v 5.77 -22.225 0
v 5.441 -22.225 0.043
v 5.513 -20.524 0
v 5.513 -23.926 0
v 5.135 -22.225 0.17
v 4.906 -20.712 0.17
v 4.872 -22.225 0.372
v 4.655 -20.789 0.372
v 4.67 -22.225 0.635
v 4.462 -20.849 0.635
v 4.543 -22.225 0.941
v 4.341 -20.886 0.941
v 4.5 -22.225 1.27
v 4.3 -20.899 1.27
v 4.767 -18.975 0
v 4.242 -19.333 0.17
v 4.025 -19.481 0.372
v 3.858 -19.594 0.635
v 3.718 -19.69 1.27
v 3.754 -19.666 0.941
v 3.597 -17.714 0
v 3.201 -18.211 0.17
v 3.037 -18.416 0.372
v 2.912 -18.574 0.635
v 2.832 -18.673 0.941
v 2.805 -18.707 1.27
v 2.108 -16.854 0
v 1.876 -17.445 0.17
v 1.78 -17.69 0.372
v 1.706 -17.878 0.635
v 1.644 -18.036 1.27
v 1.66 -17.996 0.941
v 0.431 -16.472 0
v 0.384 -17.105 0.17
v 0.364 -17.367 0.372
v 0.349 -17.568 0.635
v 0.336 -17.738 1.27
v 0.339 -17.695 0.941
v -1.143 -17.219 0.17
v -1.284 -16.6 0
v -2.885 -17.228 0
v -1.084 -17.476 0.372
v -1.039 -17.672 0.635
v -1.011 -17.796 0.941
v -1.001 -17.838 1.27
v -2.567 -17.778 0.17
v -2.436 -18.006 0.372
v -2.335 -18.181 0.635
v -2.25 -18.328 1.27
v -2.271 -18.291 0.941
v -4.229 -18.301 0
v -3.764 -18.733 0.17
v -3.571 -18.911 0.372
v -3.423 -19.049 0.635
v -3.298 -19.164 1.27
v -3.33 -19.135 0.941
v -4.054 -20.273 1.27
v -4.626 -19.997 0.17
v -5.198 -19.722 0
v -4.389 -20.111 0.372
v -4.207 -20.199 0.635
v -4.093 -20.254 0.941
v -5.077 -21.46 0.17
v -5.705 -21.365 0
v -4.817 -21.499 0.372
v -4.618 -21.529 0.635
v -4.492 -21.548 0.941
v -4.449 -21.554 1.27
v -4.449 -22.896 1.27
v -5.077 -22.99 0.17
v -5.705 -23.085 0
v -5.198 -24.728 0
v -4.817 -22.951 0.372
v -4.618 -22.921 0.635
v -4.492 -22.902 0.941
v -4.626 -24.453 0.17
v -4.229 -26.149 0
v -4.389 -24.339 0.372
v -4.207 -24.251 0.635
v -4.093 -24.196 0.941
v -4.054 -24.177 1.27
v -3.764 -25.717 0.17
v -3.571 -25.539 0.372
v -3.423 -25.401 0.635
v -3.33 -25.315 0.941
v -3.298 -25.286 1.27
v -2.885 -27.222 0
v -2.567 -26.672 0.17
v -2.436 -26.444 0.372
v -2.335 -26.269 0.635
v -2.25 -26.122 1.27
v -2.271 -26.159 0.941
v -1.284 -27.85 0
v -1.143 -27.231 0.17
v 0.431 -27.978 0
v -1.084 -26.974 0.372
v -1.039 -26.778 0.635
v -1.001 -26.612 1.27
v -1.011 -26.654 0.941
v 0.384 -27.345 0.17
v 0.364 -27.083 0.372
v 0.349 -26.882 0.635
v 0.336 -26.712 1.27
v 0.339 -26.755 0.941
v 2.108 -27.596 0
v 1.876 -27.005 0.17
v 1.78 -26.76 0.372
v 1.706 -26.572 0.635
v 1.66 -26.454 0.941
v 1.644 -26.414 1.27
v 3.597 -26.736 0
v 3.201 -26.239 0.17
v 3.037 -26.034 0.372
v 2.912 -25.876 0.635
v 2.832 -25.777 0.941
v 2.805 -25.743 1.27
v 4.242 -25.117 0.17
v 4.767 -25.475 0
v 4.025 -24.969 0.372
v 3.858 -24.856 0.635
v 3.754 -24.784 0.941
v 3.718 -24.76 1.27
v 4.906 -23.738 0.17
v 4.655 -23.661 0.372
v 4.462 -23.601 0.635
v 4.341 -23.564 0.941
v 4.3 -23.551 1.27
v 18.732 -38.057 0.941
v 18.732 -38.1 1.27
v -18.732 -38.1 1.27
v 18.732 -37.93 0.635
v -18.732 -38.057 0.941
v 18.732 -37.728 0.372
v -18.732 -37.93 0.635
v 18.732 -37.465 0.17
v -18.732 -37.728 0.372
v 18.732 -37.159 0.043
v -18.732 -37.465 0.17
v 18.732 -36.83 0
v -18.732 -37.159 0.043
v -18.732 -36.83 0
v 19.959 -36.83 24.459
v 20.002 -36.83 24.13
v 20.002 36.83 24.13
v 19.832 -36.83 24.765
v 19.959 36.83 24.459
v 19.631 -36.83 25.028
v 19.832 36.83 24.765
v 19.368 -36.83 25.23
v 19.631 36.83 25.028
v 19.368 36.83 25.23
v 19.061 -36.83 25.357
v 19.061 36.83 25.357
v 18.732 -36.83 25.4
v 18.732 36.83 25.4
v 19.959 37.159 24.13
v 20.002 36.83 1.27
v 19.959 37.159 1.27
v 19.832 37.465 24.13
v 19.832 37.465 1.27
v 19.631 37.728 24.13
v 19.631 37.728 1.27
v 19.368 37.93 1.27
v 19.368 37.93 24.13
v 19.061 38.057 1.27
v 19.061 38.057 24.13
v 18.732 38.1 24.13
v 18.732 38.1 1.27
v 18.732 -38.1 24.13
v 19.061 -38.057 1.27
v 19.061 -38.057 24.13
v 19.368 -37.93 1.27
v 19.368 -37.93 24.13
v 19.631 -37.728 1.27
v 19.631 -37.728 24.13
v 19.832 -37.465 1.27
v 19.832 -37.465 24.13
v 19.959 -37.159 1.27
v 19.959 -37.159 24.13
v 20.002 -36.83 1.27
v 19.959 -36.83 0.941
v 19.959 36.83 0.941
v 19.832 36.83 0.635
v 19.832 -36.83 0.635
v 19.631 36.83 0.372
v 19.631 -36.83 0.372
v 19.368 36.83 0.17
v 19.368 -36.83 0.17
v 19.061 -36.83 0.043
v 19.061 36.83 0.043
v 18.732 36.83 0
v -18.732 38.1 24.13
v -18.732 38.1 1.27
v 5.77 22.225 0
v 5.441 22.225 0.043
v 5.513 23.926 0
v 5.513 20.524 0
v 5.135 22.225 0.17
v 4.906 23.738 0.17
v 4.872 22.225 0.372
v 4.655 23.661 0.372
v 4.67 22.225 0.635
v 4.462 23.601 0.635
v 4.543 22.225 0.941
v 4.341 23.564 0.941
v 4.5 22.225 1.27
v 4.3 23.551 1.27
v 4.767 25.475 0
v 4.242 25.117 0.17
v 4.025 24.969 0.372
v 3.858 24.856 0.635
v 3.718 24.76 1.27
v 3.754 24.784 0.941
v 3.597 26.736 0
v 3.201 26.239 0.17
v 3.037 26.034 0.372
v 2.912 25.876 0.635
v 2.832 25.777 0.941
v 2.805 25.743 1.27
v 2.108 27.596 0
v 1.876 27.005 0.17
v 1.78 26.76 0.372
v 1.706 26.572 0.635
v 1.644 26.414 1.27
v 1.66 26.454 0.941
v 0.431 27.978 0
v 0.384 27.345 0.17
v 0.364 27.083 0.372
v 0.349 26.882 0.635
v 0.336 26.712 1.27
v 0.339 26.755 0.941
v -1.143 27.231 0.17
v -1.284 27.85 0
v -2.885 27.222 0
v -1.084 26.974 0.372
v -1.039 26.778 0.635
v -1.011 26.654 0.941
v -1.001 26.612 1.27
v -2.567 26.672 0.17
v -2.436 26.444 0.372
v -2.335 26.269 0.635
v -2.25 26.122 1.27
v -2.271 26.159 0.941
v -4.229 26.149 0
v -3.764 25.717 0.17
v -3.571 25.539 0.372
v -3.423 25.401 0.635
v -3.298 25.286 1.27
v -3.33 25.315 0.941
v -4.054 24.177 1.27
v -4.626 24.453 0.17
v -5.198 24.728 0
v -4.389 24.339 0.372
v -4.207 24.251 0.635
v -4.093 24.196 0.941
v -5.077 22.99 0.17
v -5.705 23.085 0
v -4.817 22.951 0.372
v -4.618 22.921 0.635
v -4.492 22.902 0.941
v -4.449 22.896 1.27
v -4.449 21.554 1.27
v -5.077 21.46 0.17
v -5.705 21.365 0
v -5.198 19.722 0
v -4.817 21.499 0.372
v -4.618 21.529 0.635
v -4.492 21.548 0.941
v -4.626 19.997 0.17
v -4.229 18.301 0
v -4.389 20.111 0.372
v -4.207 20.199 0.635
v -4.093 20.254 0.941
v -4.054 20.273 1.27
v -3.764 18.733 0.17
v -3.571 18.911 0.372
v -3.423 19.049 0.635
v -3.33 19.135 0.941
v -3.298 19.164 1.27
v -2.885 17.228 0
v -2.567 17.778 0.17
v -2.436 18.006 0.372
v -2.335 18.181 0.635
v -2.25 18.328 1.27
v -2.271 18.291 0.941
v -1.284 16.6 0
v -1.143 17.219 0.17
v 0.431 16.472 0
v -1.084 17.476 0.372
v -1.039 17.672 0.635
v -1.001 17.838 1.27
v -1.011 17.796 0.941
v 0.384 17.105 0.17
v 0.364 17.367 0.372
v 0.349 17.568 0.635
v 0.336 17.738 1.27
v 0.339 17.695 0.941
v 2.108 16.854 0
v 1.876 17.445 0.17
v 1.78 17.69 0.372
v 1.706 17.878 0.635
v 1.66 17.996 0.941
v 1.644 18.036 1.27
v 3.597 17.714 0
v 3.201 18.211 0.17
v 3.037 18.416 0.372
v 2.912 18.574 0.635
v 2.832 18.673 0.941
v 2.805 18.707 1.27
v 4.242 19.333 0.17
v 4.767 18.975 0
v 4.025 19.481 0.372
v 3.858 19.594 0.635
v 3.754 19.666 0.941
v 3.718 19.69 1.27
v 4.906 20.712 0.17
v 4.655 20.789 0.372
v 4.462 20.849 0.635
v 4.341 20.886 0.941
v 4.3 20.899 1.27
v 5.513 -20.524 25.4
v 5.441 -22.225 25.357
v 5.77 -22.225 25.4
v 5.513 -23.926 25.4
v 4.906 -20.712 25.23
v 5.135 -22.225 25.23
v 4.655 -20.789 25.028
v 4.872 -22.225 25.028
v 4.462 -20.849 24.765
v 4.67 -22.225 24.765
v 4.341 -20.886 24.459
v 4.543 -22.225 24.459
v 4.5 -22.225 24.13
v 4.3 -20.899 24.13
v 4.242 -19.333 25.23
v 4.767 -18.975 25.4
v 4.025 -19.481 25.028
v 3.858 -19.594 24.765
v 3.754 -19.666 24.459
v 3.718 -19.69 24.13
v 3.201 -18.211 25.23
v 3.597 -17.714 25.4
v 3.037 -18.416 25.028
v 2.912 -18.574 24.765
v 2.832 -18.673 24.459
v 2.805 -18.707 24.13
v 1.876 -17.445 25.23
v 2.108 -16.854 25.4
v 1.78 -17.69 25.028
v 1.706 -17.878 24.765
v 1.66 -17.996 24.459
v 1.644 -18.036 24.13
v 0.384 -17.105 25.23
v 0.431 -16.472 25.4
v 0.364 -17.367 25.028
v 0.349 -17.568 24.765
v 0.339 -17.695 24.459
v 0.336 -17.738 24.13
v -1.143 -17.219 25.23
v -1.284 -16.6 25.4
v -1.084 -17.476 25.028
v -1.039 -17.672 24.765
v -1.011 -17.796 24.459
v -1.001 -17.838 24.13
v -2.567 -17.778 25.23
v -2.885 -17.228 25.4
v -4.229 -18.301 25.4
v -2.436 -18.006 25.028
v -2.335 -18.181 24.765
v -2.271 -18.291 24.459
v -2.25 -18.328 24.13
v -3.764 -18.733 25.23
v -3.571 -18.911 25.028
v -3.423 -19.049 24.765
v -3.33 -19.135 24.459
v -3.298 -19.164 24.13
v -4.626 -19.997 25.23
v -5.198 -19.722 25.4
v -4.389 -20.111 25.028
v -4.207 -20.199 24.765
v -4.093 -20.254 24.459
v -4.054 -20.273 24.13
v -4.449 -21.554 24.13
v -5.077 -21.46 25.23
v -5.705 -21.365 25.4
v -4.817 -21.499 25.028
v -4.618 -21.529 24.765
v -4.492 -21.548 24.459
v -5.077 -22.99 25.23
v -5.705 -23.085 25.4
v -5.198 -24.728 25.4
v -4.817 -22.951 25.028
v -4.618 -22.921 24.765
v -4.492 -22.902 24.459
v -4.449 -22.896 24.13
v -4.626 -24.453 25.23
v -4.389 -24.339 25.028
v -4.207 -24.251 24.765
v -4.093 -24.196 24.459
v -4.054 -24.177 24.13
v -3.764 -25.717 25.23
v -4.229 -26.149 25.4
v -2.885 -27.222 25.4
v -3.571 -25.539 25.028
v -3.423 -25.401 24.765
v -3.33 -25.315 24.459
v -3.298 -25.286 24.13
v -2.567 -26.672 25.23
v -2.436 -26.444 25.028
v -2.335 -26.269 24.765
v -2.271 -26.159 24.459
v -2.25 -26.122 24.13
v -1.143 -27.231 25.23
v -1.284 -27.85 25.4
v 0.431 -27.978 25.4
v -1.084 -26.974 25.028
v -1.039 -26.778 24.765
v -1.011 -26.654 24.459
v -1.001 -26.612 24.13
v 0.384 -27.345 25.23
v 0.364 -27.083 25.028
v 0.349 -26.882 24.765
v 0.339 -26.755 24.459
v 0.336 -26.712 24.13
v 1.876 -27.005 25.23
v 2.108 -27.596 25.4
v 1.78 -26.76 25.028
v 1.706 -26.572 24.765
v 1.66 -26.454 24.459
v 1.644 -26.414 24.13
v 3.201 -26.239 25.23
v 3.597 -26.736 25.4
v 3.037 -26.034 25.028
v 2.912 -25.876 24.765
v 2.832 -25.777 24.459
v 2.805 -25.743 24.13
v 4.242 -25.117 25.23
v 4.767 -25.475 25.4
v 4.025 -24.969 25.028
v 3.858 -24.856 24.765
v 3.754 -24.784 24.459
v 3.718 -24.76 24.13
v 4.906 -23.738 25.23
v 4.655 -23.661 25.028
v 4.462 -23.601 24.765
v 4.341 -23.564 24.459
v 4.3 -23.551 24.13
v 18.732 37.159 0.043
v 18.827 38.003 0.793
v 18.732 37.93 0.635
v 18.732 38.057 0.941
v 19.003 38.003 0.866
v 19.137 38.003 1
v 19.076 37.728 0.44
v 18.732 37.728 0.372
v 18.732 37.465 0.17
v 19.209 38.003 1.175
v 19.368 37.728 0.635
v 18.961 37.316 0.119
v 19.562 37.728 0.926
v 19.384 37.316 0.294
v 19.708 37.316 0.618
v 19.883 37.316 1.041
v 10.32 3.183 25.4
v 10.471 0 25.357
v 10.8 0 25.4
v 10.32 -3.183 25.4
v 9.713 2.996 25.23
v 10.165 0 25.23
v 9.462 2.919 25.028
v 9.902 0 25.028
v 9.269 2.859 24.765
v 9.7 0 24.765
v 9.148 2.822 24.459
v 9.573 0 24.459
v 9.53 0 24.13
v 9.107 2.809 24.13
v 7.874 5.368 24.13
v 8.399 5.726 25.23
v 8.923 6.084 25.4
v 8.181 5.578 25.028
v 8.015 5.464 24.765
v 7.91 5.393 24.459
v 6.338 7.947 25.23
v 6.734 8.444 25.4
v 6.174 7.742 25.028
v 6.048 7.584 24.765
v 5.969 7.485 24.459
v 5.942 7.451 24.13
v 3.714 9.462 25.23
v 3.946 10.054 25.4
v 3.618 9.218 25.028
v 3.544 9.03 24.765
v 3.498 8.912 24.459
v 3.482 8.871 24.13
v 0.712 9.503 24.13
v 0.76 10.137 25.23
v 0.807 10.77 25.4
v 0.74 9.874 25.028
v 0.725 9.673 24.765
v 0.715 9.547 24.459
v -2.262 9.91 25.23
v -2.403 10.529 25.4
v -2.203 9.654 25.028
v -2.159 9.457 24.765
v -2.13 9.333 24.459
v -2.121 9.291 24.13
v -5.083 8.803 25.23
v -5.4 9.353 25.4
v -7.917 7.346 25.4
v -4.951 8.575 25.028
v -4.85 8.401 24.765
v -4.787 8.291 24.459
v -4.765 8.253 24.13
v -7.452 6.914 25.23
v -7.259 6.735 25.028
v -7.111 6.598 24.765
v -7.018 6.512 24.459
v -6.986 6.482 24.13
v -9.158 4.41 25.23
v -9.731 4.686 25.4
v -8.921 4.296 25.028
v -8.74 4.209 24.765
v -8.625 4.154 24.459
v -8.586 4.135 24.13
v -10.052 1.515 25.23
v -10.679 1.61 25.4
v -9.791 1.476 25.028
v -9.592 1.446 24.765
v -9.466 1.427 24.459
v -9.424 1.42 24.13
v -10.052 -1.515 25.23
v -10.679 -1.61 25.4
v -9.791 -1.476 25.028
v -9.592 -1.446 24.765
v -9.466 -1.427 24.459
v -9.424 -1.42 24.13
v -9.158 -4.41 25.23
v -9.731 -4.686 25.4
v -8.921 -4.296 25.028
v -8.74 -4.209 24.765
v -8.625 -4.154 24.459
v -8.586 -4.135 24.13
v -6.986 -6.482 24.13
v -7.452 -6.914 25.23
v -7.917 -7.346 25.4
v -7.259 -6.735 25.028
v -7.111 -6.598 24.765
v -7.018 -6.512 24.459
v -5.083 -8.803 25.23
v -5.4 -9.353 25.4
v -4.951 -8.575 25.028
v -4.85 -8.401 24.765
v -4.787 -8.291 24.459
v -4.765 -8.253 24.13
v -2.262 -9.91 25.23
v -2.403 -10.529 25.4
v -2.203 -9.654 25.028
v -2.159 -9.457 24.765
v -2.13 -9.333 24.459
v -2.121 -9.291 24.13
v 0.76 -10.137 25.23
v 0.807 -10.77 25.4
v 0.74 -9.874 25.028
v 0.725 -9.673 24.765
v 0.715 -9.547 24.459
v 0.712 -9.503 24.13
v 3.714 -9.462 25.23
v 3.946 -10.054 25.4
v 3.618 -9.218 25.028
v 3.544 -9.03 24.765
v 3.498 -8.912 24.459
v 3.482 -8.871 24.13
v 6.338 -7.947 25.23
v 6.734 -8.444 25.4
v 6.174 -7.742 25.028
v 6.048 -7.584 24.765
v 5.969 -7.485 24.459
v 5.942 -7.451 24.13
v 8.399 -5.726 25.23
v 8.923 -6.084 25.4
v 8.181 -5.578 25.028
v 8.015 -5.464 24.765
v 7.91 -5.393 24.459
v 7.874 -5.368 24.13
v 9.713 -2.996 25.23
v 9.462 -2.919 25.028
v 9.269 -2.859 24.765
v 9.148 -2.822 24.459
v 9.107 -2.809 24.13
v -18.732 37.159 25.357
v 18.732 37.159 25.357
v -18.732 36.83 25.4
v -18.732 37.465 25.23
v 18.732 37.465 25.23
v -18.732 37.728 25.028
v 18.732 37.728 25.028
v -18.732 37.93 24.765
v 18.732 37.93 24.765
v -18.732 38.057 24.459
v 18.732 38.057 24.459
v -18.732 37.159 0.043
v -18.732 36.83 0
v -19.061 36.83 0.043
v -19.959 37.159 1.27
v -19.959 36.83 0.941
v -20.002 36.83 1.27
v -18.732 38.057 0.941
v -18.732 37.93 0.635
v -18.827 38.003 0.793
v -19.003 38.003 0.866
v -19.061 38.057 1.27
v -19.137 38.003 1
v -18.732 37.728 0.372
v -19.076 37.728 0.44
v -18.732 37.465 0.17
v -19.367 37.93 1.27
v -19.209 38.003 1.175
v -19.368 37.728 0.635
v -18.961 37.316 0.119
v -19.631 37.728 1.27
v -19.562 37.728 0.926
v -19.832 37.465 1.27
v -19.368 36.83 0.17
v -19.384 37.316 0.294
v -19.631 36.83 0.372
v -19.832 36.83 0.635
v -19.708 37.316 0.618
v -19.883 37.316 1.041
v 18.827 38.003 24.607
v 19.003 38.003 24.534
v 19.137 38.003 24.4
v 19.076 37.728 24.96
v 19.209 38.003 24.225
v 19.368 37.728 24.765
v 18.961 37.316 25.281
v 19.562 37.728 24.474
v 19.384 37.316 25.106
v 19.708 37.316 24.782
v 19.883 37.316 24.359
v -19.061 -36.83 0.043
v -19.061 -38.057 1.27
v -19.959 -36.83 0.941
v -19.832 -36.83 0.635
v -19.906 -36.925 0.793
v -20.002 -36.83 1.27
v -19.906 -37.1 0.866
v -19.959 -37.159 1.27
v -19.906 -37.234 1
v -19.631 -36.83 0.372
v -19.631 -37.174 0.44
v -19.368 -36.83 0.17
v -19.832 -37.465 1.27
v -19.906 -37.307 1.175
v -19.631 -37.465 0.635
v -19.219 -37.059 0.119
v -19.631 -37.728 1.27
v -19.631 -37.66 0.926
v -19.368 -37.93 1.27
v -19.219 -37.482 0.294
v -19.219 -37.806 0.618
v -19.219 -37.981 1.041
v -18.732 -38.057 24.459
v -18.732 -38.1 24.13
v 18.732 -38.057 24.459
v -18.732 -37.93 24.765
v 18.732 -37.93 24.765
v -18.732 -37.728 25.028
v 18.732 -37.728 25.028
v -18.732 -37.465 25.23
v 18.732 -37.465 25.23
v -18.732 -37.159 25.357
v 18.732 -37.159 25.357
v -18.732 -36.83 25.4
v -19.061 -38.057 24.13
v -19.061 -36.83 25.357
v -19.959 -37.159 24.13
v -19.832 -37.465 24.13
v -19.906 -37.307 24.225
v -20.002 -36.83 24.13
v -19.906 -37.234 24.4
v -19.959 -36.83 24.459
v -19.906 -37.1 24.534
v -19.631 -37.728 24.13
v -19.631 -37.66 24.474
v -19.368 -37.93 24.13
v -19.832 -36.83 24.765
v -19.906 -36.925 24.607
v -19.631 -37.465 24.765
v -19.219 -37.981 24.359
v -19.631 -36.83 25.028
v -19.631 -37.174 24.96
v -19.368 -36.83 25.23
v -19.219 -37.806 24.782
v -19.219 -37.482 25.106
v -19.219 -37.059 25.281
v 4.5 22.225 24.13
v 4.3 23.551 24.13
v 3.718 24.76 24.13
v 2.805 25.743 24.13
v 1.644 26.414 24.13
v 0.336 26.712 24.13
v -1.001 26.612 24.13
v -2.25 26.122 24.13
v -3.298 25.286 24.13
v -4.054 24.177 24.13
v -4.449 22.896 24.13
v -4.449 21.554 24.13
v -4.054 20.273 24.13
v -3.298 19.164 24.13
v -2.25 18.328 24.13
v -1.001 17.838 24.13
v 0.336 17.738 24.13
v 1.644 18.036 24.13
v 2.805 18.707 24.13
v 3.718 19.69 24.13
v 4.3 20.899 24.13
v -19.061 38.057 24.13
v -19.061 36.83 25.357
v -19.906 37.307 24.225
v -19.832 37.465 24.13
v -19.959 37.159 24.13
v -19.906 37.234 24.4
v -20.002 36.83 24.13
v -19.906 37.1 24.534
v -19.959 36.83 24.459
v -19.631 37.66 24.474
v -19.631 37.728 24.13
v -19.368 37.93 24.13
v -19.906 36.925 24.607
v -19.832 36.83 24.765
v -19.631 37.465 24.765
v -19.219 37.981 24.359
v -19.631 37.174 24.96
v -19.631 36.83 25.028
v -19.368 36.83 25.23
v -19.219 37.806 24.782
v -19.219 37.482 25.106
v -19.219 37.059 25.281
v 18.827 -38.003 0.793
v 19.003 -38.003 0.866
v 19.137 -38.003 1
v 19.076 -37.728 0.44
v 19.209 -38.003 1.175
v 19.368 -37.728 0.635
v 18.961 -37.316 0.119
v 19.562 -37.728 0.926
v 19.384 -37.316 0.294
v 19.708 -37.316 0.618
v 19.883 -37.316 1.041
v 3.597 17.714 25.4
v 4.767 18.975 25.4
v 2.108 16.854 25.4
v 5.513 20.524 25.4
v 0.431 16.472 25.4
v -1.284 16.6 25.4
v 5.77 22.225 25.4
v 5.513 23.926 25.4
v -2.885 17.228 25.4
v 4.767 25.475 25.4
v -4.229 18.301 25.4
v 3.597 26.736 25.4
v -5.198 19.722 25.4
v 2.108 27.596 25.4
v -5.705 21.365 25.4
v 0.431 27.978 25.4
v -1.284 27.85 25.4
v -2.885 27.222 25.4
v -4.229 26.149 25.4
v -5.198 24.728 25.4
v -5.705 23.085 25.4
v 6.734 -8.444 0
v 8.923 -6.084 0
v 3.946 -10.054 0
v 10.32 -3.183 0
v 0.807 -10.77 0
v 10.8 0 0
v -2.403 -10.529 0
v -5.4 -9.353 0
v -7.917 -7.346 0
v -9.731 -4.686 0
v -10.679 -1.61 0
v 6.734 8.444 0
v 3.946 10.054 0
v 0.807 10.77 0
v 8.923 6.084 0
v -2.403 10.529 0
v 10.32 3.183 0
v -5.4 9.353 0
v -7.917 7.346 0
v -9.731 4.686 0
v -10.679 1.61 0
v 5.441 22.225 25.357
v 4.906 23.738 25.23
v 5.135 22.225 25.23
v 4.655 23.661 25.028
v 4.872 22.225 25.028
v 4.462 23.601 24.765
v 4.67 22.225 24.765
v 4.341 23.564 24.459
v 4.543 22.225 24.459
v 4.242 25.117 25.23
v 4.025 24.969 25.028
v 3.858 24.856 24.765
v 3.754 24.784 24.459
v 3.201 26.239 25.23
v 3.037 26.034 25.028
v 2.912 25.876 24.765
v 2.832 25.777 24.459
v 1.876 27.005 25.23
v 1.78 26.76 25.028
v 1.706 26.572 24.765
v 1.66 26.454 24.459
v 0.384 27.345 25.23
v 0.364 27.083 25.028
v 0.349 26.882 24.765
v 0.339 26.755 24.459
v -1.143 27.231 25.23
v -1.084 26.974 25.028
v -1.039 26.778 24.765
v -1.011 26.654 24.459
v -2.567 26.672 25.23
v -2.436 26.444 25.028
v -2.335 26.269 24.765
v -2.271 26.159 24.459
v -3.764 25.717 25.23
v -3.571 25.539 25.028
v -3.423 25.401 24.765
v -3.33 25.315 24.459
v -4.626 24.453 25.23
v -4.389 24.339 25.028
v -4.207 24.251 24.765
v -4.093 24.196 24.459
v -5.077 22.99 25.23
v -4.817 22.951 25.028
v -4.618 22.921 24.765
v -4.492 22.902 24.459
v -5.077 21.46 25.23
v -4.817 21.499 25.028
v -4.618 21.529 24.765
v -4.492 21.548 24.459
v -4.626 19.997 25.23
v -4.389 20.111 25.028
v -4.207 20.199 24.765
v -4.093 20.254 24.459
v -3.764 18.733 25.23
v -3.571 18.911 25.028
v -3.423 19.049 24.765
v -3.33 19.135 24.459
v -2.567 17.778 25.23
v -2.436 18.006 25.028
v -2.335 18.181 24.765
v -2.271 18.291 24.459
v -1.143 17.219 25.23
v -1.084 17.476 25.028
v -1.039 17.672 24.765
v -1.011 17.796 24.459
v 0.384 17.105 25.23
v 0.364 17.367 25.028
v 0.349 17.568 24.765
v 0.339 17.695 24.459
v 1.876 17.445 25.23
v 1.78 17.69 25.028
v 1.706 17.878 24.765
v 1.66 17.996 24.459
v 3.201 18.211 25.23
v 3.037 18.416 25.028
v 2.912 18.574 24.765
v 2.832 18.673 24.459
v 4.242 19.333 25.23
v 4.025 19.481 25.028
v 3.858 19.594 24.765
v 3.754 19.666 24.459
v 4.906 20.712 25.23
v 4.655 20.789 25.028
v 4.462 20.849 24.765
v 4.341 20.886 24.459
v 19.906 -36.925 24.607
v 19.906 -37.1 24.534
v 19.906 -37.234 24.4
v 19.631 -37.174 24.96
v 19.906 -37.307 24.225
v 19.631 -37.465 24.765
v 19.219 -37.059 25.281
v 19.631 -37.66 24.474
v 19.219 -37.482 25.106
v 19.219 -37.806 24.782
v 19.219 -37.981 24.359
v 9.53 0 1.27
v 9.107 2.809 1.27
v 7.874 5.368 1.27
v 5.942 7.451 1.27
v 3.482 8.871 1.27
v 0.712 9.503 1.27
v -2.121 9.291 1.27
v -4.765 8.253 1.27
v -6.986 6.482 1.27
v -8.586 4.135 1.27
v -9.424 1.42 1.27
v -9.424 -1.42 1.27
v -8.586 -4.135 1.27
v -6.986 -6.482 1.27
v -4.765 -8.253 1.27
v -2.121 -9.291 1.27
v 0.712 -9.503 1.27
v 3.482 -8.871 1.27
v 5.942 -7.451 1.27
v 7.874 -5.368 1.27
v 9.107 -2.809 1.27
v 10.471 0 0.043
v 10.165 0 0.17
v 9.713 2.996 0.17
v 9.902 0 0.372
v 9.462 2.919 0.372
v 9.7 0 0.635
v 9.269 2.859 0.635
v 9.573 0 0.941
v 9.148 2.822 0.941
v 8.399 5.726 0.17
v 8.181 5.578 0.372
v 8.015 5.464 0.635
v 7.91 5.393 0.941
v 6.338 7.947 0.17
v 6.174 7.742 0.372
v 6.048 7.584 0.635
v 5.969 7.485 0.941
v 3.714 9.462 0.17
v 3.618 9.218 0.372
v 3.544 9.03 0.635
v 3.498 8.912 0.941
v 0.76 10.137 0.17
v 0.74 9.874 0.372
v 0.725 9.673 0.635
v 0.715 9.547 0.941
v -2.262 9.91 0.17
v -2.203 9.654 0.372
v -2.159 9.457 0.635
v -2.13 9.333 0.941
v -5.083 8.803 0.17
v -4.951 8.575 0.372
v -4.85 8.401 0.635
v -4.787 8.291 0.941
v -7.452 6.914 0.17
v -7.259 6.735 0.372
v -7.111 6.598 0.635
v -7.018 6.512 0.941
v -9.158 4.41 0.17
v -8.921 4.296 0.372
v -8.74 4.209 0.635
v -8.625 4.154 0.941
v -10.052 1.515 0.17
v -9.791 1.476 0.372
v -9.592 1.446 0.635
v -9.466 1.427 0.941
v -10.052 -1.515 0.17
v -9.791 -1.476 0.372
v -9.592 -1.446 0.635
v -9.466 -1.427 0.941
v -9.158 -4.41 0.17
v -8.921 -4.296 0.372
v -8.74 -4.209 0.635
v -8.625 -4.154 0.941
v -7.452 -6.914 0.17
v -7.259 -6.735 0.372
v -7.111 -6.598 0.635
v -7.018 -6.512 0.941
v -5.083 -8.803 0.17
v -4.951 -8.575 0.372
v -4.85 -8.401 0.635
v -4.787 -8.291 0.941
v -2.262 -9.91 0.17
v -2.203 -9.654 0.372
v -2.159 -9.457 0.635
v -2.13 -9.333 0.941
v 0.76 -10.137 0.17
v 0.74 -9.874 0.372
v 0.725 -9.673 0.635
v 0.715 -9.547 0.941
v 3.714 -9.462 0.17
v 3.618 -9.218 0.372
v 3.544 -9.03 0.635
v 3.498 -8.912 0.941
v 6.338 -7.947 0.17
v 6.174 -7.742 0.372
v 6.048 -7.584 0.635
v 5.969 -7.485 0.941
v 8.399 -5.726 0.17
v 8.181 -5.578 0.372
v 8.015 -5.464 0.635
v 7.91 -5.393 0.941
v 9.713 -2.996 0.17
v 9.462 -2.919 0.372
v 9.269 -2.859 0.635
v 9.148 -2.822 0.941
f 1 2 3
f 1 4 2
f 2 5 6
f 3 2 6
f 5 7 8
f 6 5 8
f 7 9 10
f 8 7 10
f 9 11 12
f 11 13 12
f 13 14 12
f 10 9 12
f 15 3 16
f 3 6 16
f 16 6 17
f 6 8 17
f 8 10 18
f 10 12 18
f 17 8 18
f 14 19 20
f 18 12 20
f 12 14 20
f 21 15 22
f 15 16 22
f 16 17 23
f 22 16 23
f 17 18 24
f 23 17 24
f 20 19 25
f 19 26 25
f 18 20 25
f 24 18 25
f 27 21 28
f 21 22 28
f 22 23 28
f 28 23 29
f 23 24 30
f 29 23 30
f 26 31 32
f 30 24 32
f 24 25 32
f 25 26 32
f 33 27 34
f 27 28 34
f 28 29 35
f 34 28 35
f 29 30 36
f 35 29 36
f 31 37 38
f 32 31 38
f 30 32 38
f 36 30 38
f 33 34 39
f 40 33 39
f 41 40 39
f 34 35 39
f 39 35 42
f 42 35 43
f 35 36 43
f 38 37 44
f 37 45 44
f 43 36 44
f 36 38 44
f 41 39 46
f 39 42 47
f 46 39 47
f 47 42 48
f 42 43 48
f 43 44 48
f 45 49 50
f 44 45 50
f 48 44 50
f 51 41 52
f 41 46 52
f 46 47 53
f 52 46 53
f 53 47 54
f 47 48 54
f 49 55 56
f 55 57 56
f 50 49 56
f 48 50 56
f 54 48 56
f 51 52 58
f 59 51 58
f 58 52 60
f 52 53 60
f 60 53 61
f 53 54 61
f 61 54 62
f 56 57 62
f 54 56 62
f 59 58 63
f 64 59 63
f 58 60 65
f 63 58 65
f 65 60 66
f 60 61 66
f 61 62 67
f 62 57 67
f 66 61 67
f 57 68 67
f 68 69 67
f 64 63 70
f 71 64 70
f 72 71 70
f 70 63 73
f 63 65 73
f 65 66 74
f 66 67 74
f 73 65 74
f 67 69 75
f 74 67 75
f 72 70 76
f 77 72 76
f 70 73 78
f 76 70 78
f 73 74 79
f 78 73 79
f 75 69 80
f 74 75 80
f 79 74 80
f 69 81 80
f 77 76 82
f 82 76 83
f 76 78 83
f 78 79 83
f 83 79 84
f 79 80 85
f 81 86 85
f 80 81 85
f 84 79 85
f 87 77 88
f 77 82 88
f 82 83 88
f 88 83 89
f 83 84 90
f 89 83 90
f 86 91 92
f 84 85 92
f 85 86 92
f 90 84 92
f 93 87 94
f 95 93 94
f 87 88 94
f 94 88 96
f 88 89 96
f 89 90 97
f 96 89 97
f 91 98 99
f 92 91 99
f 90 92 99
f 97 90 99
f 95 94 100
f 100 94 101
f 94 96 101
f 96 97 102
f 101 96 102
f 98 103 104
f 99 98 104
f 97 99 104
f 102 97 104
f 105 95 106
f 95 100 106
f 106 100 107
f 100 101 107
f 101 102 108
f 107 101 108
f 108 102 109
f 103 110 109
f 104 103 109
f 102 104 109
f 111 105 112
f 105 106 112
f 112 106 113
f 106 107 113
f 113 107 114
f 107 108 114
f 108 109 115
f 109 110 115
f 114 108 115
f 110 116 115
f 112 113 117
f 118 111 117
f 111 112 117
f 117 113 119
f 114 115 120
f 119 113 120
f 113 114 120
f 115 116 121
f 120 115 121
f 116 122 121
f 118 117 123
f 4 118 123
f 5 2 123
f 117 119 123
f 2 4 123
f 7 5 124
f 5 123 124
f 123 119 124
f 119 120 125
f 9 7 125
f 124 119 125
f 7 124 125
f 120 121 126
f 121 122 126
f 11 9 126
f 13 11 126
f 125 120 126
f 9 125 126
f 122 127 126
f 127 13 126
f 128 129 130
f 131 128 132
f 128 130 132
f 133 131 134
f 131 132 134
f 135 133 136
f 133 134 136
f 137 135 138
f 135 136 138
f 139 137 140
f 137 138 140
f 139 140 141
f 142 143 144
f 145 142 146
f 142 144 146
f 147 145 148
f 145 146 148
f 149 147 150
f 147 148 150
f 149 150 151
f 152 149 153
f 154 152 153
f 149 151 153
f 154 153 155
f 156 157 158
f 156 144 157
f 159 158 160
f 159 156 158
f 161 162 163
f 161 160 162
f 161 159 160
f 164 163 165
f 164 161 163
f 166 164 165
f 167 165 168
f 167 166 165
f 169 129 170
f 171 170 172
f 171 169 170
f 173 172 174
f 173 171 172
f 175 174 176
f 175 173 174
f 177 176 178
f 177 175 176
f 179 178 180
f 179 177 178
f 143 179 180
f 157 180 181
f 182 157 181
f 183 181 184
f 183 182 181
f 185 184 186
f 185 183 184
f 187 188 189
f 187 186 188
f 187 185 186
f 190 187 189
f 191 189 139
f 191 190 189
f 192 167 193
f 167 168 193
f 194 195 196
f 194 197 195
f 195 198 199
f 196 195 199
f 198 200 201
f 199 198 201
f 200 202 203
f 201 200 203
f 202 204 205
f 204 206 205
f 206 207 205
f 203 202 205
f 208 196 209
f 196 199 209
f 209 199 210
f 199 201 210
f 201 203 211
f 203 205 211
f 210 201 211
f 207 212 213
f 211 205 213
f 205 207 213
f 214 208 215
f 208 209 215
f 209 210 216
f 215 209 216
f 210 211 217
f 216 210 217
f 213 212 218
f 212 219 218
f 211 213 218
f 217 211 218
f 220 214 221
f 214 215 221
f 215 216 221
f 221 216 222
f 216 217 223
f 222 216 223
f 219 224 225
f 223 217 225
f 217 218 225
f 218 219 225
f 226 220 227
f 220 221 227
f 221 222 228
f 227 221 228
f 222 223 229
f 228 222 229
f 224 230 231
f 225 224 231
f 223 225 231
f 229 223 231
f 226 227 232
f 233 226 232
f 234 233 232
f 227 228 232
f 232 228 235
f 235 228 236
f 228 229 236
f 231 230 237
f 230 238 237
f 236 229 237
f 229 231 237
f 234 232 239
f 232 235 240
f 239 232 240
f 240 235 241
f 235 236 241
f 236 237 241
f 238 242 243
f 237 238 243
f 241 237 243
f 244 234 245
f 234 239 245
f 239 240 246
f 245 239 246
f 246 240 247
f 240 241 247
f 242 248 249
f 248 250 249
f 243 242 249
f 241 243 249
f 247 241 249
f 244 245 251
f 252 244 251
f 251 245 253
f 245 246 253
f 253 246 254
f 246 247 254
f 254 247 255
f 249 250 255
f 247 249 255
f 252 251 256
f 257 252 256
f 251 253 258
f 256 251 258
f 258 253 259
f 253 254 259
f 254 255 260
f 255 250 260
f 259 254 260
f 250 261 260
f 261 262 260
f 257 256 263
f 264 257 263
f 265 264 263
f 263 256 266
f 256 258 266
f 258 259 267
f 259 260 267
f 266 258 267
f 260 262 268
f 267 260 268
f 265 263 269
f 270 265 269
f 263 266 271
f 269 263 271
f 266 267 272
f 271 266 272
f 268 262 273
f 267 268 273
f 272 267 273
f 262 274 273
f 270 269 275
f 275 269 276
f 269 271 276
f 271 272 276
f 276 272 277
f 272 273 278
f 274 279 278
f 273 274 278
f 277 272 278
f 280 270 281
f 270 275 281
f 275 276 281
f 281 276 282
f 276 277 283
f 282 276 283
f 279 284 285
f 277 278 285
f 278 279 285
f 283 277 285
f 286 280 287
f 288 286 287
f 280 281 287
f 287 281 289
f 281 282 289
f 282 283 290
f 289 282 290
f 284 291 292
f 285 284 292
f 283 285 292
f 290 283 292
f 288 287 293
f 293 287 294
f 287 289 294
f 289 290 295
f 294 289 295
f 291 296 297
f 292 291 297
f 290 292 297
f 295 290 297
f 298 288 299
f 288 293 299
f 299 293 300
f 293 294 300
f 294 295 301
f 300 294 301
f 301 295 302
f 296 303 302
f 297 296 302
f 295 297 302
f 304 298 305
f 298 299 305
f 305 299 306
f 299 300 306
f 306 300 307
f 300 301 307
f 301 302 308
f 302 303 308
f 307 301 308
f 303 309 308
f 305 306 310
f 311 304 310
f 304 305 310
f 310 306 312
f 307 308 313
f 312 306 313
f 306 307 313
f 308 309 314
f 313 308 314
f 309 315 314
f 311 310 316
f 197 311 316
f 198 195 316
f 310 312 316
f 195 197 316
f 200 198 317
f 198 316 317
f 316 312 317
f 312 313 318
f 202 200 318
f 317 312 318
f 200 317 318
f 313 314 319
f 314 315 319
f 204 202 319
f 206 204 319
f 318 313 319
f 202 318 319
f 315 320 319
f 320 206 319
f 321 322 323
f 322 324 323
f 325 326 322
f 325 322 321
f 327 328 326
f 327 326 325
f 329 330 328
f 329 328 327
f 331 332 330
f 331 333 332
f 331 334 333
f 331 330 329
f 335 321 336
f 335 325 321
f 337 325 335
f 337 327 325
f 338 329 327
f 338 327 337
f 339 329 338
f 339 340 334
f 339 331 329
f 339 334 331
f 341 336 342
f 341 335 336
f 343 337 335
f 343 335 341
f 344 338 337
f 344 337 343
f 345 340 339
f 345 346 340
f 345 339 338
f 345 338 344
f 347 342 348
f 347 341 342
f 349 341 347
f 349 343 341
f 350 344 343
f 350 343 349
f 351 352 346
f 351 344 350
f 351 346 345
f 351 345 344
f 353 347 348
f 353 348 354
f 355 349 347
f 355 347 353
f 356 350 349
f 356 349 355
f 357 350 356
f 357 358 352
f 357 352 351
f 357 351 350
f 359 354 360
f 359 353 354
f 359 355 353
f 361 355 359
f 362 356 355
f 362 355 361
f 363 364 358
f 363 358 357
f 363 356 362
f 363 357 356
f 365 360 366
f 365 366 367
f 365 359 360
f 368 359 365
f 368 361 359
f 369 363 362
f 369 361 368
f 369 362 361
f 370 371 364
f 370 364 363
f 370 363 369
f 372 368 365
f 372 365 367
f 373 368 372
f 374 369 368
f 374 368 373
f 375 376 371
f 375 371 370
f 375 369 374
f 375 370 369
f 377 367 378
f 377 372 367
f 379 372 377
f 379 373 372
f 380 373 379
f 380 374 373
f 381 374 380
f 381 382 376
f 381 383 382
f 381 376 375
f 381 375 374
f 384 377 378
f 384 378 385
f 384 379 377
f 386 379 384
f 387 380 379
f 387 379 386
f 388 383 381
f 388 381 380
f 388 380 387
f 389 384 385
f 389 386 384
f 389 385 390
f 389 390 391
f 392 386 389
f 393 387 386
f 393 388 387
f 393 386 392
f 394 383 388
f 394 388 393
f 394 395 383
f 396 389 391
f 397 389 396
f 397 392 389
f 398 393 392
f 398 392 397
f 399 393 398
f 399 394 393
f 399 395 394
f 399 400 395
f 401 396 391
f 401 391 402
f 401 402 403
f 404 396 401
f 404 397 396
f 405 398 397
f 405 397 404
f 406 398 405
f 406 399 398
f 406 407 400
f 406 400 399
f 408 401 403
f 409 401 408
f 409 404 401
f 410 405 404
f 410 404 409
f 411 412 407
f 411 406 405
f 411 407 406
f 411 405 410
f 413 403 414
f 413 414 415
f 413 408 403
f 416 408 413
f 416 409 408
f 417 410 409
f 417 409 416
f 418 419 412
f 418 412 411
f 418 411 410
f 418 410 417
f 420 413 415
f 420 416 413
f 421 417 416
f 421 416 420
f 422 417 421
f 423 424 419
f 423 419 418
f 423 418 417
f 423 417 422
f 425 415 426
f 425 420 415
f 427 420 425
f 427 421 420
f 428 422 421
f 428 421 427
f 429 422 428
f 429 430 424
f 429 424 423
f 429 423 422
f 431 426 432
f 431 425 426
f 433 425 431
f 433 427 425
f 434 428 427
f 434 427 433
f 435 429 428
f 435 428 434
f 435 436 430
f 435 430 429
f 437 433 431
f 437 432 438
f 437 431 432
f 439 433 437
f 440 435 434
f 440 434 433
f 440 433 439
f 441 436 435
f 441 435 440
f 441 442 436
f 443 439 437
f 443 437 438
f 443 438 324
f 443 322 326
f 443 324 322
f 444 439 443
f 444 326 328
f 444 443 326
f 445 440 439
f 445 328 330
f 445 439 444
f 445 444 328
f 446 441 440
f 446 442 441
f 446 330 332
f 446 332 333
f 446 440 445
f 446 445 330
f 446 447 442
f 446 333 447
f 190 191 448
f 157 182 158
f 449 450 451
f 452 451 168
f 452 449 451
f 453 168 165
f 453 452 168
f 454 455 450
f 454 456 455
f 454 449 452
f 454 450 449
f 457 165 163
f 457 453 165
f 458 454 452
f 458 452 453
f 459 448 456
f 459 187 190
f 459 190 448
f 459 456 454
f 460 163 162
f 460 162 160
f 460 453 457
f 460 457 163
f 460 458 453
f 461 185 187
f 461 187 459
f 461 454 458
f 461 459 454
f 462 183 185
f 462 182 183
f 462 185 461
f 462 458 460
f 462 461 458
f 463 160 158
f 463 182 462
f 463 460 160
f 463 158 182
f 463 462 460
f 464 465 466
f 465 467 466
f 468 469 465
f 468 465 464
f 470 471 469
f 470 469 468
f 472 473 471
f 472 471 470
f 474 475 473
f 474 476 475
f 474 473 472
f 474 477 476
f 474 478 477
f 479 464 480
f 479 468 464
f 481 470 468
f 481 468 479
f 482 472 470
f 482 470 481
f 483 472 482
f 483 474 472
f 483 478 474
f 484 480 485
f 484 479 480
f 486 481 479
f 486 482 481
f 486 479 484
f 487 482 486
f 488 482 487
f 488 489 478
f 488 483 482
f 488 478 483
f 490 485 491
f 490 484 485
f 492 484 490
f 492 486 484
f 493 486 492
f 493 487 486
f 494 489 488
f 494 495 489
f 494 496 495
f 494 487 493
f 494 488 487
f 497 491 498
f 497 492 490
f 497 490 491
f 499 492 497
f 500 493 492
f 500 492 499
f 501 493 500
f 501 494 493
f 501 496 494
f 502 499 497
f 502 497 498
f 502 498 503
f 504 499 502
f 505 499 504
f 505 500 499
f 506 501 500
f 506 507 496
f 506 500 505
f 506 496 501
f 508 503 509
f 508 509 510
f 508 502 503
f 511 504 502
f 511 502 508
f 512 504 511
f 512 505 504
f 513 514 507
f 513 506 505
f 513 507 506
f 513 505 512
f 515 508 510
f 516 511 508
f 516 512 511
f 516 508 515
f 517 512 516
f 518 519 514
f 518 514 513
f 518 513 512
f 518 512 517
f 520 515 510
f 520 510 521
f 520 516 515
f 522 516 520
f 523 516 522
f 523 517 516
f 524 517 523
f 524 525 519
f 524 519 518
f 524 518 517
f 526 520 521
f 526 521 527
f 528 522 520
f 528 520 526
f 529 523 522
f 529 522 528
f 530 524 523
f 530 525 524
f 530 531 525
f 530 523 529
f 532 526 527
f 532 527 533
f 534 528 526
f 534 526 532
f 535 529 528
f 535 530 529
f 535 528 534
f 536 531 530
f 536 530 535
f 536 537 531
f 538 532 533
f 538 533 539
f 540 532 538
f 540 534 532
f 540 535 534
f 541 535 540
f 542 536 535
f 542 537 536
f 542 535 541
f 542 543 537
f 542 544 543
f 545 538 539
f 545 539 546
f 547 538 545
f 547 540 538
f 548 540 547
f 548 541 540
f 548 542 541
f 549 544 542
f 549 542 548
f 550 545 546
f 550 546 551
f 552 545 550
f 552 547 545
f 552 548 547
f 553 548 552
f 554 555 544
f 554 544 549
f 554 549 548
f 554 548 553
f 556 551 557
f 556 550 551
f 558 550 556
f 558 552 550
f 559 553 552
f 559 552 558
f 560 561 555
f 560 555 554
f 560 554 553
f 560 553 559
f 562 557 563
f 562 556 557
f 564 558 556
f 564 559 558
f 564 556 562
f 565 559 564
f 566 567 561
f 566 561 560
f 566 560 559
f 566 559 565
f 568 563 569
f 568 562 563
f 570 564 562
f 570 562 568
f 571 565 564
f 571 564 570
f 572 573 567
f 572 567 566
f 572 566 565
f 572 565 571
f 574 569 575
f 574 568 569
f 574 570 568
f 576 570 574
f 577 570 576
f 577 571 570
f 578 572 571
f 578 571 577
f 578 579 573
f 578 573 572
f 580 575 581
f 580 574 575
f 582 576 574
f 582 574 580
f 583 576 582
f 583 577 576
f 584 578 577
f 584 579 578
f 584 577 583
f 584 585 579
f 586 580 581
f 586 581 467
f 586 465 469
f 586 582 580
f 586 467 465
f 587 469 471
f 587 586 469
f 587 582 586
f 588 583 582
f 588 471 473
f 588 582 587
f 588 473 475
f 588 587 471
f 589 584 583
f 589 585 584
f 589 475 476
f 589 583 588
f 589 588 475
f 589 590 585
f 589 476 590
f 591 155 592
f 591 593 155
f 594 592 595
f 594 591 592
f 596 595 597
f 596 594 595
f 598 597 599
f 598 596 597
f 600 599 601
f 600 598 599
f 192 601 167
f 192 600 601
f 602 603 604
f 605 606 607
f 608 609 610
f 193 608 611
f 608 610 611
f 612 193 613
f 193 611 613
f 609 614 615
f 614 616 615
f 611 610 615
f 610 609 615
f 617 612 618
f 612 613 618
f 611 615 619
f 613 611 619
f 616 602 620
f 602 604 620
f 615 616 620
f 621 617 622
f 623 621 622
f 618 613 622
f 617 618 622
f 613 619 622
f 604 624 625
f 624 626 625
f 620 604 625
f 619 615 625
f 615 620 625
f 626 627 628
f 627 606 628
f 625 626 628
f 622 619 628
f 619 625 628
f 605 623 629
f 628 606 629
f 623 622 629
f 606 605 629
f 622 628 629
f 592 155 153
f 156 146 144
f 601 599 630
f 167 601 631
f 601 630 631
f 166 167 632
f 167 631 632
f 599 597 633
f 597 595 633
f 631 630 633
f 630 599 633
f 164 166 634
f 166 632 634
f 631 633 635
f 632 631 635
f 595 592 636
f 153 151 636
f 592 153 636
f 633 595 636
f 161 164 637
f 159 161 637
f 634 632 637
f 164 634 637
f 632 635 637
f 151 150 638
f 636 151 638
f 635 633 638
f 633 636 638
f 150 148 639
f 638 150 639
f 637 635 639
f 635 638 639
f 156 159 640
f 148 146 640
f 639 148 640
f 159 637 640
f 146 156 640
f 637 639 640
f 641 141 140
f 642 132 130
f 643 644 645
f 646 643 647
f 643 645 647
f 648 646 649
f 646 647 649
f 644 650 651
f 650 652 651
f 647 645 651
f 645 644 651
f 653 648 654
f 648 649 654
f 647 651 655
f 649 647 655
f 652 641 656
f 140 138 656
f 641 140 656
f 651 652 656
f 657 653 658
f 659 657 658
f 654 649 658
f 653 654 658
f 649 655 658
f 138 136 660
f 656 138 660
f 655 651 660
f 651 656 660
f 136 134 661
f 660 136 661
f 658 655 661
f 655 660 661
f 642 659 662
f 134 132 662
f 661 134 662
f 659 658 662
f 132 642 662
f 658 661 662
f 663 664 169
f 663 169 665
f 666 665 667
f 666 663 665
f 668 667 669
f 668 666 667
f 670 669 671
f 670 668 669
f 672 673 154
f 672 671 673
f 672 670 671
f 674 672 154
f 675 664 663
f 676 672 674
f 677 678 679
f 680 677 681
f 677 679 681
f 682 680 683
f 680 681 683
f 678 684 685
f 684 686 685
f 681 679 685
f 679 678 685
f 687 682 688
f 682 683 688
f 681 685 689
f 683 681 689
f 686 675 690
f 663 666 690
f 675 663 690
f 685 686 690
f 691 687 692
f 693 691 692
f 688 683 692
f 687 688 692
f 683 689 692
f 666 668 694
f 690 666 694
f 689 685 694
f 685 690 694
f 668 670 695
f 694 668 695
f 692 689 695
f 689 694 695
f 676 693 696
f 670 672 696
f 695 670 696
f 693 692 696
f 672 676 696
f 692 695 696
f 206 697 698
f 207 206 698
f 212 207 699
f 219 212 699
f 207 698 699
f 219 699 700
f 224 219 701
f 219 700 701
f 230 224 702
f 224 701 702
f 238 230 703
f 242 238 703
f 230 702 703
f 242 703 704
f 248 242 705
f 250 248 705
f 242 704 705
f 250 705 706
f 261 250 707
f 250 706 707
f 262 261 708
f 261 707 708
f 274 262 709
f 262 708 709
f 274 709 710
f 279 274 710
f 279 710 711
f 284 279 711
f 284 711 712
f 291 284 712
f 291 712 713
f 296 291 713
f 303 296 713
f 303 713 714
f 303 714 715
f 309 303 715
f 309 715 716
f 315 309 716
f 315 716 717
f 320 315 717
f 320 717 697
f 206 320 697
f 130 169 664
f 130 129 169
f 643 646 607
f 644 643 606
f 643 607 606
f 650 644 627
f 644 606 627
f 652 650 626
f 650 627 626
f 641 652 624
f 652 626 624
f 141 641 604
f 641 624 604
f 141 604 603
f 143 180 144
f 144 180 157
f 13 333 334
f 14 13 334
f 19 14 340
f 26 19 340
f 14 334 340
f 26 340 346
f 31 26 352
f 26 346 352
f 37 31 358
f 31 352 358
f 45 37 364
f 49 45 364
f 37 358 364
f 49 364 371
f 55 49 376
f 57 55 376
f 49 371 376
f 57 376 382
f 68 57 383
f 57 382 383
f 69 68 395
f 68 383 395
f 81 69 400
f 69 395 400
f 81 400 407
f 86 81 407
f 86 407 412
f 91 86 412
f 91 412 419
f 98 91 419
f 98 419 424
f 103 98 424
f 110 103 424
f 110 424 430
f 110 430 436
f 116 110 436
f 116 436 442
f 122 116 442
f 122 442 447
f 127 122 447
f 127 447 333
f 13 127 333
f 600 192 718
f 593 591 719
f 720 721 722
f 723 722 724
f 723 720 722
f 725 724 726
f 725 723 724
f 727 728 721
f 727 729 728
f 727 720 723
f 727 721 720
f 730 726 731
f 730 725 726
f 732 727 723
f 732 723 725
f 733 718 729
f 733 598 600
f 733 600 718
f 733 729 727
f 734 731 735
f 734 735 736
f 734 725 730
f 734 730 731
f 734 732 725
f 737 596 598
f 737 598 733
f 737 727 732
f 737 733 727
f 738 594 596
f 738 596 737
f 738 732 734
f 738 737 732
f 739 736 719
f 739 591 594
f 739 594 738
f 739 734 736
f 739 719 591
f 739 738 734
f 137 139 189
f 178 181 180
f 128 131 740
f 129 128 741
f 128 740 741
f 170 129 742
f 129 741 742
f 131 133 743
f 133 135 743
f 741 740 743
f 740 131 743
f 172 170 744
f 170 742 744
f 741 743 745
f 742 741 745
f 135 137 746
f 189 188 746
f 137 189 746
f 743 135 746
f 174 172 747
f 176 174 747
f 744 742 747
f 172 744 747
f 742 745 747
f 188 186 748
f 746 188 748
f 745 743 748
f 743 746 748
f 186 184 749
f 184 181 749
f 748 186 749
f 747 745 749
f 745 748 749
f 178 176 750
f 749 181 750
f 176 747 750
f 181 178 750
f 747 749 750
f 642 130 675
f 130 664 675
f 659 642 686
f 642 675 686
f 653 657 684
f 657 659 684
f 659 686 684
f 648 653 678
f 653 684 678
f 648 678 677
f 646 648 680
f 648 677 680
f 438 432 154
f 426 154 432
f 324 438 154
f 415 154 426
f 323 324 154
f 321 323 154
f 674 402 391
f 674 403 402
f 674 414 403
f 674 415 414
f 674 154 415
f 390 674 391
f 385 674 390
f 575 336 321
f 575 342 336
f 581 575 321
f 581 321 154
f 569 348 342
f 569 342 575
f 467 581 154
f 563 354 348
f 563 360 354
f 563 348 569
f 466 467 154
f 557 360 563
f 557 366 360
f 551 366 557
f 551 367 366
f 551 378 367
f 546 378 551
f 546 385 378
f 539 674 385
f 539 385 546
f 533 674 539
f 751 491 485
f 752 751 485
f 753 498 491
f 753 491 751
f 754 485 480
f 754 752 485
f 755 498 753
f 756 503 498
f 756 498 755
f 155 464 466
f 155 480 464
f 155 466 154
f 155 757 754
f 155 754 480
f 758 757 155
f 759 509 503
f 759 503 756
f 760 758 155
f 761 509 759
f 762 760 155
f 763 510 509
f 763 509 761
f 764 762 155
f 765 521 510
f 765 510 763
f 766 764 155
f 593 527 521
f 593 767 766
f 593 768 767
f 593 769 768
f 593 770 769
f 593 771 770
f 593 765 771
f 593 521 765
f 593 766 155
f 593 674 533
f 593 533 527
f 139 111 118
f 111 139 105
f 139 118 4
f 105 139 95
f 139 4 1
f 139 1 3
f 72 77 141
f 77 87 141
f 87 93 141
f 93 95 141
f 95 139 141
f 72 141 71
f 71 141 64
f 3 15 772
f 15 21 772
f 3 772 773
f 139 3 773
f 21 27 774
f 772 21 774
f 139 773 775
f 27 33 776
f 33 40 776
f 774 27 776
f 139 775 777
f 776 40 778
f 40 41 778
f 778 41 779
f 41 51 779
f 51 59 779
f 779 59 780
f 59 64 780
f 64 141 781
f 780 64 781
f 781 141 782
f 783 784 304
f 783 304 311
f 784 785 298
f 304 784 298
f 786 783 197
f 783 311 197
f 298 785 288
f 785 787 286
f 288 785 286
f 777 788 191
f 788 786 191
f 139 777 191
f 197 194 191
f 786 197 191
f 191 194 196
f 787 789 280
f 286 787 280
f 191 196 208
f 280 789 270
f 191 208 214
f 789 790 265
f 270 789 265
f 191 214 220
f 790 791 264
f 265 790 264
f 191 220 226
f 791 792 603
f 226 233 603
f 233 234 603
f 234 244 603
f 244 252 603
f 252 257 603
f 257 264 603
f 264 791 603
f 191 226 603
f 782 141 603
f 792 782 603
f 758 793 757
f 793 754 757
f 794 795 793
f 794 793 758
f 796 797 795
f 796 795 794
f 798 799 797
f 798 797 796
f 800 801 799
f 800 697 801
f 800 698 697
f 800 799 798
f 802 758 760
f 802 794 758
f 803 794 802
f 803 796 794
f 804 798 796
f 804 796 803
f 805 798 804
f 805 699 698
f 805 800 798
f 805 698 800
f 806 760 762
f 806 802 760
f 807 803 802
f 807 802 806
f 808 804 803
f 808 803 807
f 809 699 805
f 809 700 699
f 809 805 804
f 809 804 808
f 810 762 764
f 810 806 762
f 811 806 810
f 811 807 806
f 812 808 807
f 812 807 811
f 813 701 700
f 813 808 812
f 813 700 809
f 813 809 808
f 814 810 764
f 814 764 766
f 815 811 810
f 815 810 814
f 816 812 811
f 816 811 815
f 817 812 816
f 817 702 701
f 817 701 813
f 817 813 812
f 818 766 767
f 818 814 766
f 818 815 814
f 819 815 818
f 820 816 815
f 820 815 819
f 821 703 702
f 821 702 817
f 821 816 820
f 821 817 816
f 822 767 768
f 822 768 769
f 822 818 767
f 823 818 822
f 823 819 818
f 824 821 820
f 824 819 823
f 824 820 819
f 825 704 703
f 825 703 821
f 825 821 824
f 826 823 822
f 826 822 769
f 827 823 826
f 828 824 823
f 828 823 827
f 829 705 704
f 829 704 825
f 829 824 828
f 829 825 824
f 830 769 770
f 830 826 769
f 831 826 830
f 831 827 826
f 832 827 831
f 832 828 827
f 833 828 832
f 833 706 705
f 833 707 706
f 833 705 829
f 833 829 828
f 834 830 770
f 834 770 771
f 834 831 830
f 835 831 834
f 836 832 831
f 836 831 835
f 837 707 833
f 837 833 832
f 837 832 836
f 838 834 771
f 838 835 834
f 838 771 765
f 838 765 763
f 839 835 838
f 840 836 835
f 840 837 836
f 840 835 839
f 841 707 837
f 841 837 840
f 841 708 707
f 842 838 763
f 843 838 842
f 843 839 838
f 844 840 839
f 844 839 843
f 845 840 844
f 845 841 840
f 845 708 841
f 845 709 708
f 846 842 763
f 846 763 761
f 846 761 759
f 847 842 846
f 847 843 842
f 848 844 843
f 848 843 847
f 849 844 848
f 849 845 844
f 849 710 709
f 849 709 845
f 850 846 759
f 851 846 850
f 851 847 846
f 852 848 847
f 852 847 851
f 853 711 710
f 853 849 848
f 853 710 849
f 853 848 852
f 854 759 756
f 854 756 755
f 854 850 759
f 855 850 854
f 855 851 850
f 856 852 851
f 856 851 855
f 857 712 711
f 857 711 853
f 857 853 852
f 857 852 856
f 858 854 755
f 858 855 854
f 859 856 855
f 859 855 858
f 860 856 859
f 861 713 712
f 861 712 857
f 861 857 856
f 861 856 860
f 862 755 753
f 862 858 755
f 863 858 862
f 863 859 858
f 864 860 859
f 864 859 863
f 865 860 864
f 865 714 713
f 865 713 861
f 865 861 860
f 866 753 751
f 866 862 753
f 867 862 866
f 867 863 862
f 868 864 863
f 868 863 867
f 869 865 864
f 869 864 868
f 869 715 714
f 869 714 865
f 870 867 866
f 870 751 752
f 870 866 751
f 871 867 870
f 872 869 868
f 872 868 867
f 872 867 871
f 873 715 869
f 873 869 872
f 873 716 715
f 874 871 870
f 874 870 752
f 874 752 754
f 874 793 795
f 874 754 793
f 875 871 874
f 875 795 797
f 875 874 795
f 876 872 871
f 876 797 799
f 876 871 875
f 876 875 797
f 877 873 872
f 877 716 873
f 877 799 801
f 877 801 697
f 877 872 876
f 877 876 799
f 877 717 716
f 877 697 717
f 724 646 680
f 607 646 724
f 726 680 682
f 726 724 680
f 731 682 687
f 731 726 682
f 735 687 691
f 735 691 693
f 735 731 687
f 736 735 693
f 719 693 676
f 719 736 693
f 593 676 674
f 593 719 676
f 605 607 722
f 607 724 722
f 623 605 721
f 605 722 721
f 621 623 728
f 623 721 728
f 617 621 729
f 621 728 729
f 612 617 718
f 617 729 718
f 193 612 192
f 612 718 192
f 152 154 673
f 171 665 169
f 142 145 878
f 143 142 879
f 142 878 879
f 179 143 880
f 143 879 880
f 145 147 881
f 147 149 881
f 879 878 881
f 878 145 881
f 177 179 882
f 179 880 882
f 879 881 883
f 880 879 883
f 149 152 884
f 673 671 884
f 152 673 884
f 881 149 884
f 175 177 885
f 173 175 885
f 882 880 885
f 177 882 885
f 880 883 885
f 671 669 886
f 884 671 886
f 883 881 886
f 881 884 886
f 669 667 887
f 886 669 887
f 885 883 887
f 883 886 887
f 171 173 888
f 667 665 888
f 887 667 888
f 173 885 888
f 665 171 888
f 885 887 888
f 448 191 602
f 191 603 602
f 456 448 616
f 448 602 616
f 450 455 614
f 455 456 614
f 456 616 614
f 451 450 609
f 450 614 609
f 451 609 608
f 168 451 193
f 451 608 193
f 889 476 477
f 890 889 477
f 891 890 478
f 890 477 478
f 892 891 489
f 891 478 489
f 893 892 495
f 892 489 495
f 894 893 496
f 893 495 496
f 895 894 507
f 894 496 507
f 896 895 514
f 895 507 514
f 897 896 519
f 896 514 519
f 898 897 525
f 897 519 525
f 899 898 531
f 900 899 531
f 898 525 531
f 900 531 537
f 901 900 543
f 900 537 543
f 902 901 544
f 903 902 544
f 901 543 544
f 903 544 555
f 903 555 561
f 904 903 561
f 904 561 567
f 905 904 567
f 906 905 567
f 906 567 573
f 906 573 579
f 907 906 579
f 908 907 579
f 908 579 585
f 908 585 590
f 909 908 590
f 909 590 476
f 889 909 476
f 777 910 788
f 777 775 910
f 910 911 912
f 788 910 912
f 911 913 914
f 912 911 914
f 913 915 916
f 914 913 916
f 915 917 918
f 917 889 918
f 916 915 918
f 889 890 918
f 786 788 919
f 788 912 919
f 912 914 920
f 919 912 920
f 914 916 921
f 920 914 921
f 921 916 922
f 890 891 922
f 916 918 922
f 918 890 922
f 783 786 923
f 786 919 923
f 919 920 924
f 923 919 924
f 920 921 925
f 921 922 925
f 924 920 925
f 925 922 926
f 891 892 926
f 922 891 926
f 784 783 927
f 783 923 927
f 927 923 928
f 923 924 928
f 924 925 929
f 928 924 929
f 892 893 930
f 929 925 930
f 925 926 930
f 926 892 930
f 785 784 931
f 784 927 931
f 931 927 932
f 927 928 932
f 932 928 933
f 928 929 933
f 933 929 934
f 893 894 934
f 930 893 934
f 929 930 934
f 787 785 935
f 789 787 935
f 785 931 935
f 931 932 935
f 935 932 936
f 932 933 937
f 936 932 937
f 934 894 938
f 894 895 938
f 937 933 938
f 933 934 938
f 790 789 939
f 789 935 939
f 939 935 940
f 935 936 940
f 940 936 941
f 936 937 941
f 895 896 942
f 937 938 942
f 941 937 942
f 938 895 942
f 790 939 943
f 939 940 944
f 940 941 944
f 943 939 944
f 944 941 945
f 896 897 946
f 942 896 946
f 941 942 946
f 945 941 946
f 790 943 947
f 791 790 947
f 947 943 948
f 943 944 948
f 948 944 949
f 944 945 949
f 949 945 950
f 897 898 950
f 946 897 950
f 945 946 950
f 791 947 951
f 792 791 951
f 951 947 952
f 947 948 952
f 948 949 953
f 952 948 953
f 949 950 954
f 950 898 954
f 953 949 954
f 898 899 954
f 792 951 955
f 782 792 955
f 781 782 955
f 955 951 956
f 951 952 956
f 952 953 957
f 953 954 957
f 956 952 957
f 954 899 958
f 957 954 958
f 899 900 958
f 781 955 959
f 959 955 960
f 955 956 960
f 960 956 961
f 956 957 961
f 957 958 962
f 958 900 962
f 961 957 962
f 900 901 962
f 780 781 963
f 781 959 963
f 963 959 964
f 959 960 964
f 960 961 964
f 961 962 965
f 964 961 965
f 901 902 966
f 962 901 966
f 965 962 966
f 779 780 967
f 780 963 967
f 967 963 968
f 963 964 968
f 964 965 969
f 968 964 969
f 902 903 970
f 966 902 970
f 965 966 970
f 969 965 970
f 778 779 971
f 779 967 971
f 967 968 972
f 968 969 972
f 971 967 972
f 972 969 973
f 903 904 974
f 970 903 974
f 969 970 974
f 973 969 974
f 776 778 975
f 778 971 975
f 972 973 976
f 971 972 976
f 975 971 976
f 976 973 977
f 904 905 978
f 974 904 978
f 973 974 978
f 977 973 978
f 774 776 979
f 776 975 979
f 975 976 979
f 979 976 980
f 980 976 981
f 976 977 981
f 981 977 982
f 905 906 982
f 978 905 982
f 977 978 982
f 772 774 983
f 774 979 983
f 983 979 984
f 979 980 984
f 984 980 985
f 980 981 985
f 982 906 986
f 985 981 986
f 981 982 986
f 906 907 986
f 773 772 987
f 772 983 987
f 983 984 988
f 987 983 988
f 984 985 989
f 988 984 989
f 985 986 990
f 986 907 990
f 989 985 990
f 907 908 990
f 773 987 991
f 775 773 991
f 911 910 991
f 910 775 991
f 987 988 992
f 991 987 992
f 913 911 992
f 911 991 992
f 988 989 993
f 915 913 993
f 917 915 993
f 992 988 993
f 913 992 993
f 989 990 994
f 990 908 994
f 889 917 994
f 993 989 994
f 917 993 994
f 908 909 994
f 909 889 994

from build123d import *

# Parameters (mm, degrees)
SKETCH1_W           = 76.2
SKETCH1_H           = 40.005
BOSS_EXTRUDE1_DEPTH = 25.4
SKETCH2_R           = 9.53008
CUT_EXTRUDE1_DEPTH  = 50.96869026
SKETCH3_R           = 4.49961
CUT_EXTRUDE2_DEPTH  = 50.96869026
FILLET1_R           = 1.27


with BuildPart() as part:
    # Sketch1 → Boss-Extrude1 (new body)
    with BuildSketch(Plane(origin=(0, 0, 0), x_dir=(0, 1, 0), z_dir=(0, 0, 1))):
        Rectangle(SKETCH1_W, SKETCH1_H)
    extrude(amount=BOSS_EXTRUDE1_DEPTH)

    # Sketch2 → Cut-Extrude1 (cut, through all)
    with BuildSketch(Plane.XY.offset(25.4)):
        Circle(SKETCH2_R)
    extrude(amount=-CUT_EXTRUDE1_DEPTH, mode=Mode.SUBTRACT)

    # Sketch3 → Cut-Extrude2 (cut, through all)
    with BuildSketch(Plane.XY.offset(25.4)):
        with Locations((0, 22.225)):
            Circle(SKETCH3_R)
        with Locations((0, -22.225)):
            Circle(SKETCH3_R)
    extrude(amount=-CUT_EXTRUDE2_DEPTH, mode=Mode.SUBTRACT)

    # Fillet1
    fillet1_edges = [part.edges().sort_by_distance(p)[0] for p in [
        (0, -38.1, 25.4),
        (-9.53008, 0, 0),
        (-9.53008, 0, 25.4),
        (20.0025, 0, 25.4),
        (-4.49961, 22.225, 0),
        (-4.49961, 22.225, 25.4),
        (-4.49961, -22.225, 0),
        (-4.49961, -22.225, 25.4),
        (0, 38.1, 25.4),
        (20.0025, 0, 0),
        (0, -38.1, 0),
        (-20.0025, 0, 0),
        (0, 38.1, 0),
        (20.0025, 38.1, 12.7),
        (20.0025, -38.1, 12.7),
        (-20.0025, -38.1, 12.7),
        (-20.0025, 38.1, 12.7),
        (-20.0025, 0, 25.4),
    ]]
    fillet(fillet1_edges, radius=FILLET1_R)


solid = part.part
